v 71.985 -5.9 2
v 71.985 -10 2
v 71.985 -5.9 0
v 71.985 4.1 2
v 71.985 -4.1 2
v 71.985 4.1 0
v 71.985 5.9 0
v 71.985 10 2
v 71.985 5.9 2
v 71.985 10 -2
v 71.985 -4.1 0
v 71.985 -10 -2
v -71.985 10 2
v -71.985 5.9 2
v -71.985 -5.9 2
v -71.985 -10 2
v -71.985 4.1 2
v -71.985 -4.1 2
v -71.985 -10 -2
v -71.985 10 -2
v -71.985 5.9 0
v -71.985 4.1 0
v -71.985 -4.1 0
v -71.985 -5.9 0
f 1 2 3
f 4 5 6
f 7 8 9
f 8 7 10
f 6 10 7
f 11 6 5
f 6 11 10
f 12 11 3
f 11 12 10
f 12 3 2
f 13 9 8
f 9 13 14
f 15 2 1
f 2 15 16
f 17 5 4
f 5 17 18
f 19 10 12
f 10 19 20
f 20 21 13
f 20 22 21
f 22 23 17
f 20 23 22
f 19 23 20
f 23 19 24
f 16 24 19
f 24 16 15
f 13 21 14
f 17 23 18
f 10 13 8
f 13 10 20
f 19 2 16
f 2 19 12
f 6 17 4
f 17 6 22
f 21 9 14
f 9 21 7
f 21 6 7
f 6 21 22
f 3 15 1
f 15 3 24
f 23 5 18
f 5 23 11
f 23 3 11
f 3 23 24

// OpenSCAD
$fn = 100;
difference()
{
  cube(size = [143.97, 20, 4], center = true);
  translate(v = [0, 5, 0])
  {
    translate(v = [0, 0, 24])
    {
      rotate(a = 90, v = [1, 0, 0])
      {
        cube(size = [144, 48, 1.8], center = true);
      }
    }
  }
  translate(v = [0, -5, 0])
  {
    translate(v = [0, 0, 24])
    {
      rotate(a = 90, v = [1, 0, 0])
      {
        cube(size = [144, 48, 1.8], center = true);
      }
    }
  }
}
